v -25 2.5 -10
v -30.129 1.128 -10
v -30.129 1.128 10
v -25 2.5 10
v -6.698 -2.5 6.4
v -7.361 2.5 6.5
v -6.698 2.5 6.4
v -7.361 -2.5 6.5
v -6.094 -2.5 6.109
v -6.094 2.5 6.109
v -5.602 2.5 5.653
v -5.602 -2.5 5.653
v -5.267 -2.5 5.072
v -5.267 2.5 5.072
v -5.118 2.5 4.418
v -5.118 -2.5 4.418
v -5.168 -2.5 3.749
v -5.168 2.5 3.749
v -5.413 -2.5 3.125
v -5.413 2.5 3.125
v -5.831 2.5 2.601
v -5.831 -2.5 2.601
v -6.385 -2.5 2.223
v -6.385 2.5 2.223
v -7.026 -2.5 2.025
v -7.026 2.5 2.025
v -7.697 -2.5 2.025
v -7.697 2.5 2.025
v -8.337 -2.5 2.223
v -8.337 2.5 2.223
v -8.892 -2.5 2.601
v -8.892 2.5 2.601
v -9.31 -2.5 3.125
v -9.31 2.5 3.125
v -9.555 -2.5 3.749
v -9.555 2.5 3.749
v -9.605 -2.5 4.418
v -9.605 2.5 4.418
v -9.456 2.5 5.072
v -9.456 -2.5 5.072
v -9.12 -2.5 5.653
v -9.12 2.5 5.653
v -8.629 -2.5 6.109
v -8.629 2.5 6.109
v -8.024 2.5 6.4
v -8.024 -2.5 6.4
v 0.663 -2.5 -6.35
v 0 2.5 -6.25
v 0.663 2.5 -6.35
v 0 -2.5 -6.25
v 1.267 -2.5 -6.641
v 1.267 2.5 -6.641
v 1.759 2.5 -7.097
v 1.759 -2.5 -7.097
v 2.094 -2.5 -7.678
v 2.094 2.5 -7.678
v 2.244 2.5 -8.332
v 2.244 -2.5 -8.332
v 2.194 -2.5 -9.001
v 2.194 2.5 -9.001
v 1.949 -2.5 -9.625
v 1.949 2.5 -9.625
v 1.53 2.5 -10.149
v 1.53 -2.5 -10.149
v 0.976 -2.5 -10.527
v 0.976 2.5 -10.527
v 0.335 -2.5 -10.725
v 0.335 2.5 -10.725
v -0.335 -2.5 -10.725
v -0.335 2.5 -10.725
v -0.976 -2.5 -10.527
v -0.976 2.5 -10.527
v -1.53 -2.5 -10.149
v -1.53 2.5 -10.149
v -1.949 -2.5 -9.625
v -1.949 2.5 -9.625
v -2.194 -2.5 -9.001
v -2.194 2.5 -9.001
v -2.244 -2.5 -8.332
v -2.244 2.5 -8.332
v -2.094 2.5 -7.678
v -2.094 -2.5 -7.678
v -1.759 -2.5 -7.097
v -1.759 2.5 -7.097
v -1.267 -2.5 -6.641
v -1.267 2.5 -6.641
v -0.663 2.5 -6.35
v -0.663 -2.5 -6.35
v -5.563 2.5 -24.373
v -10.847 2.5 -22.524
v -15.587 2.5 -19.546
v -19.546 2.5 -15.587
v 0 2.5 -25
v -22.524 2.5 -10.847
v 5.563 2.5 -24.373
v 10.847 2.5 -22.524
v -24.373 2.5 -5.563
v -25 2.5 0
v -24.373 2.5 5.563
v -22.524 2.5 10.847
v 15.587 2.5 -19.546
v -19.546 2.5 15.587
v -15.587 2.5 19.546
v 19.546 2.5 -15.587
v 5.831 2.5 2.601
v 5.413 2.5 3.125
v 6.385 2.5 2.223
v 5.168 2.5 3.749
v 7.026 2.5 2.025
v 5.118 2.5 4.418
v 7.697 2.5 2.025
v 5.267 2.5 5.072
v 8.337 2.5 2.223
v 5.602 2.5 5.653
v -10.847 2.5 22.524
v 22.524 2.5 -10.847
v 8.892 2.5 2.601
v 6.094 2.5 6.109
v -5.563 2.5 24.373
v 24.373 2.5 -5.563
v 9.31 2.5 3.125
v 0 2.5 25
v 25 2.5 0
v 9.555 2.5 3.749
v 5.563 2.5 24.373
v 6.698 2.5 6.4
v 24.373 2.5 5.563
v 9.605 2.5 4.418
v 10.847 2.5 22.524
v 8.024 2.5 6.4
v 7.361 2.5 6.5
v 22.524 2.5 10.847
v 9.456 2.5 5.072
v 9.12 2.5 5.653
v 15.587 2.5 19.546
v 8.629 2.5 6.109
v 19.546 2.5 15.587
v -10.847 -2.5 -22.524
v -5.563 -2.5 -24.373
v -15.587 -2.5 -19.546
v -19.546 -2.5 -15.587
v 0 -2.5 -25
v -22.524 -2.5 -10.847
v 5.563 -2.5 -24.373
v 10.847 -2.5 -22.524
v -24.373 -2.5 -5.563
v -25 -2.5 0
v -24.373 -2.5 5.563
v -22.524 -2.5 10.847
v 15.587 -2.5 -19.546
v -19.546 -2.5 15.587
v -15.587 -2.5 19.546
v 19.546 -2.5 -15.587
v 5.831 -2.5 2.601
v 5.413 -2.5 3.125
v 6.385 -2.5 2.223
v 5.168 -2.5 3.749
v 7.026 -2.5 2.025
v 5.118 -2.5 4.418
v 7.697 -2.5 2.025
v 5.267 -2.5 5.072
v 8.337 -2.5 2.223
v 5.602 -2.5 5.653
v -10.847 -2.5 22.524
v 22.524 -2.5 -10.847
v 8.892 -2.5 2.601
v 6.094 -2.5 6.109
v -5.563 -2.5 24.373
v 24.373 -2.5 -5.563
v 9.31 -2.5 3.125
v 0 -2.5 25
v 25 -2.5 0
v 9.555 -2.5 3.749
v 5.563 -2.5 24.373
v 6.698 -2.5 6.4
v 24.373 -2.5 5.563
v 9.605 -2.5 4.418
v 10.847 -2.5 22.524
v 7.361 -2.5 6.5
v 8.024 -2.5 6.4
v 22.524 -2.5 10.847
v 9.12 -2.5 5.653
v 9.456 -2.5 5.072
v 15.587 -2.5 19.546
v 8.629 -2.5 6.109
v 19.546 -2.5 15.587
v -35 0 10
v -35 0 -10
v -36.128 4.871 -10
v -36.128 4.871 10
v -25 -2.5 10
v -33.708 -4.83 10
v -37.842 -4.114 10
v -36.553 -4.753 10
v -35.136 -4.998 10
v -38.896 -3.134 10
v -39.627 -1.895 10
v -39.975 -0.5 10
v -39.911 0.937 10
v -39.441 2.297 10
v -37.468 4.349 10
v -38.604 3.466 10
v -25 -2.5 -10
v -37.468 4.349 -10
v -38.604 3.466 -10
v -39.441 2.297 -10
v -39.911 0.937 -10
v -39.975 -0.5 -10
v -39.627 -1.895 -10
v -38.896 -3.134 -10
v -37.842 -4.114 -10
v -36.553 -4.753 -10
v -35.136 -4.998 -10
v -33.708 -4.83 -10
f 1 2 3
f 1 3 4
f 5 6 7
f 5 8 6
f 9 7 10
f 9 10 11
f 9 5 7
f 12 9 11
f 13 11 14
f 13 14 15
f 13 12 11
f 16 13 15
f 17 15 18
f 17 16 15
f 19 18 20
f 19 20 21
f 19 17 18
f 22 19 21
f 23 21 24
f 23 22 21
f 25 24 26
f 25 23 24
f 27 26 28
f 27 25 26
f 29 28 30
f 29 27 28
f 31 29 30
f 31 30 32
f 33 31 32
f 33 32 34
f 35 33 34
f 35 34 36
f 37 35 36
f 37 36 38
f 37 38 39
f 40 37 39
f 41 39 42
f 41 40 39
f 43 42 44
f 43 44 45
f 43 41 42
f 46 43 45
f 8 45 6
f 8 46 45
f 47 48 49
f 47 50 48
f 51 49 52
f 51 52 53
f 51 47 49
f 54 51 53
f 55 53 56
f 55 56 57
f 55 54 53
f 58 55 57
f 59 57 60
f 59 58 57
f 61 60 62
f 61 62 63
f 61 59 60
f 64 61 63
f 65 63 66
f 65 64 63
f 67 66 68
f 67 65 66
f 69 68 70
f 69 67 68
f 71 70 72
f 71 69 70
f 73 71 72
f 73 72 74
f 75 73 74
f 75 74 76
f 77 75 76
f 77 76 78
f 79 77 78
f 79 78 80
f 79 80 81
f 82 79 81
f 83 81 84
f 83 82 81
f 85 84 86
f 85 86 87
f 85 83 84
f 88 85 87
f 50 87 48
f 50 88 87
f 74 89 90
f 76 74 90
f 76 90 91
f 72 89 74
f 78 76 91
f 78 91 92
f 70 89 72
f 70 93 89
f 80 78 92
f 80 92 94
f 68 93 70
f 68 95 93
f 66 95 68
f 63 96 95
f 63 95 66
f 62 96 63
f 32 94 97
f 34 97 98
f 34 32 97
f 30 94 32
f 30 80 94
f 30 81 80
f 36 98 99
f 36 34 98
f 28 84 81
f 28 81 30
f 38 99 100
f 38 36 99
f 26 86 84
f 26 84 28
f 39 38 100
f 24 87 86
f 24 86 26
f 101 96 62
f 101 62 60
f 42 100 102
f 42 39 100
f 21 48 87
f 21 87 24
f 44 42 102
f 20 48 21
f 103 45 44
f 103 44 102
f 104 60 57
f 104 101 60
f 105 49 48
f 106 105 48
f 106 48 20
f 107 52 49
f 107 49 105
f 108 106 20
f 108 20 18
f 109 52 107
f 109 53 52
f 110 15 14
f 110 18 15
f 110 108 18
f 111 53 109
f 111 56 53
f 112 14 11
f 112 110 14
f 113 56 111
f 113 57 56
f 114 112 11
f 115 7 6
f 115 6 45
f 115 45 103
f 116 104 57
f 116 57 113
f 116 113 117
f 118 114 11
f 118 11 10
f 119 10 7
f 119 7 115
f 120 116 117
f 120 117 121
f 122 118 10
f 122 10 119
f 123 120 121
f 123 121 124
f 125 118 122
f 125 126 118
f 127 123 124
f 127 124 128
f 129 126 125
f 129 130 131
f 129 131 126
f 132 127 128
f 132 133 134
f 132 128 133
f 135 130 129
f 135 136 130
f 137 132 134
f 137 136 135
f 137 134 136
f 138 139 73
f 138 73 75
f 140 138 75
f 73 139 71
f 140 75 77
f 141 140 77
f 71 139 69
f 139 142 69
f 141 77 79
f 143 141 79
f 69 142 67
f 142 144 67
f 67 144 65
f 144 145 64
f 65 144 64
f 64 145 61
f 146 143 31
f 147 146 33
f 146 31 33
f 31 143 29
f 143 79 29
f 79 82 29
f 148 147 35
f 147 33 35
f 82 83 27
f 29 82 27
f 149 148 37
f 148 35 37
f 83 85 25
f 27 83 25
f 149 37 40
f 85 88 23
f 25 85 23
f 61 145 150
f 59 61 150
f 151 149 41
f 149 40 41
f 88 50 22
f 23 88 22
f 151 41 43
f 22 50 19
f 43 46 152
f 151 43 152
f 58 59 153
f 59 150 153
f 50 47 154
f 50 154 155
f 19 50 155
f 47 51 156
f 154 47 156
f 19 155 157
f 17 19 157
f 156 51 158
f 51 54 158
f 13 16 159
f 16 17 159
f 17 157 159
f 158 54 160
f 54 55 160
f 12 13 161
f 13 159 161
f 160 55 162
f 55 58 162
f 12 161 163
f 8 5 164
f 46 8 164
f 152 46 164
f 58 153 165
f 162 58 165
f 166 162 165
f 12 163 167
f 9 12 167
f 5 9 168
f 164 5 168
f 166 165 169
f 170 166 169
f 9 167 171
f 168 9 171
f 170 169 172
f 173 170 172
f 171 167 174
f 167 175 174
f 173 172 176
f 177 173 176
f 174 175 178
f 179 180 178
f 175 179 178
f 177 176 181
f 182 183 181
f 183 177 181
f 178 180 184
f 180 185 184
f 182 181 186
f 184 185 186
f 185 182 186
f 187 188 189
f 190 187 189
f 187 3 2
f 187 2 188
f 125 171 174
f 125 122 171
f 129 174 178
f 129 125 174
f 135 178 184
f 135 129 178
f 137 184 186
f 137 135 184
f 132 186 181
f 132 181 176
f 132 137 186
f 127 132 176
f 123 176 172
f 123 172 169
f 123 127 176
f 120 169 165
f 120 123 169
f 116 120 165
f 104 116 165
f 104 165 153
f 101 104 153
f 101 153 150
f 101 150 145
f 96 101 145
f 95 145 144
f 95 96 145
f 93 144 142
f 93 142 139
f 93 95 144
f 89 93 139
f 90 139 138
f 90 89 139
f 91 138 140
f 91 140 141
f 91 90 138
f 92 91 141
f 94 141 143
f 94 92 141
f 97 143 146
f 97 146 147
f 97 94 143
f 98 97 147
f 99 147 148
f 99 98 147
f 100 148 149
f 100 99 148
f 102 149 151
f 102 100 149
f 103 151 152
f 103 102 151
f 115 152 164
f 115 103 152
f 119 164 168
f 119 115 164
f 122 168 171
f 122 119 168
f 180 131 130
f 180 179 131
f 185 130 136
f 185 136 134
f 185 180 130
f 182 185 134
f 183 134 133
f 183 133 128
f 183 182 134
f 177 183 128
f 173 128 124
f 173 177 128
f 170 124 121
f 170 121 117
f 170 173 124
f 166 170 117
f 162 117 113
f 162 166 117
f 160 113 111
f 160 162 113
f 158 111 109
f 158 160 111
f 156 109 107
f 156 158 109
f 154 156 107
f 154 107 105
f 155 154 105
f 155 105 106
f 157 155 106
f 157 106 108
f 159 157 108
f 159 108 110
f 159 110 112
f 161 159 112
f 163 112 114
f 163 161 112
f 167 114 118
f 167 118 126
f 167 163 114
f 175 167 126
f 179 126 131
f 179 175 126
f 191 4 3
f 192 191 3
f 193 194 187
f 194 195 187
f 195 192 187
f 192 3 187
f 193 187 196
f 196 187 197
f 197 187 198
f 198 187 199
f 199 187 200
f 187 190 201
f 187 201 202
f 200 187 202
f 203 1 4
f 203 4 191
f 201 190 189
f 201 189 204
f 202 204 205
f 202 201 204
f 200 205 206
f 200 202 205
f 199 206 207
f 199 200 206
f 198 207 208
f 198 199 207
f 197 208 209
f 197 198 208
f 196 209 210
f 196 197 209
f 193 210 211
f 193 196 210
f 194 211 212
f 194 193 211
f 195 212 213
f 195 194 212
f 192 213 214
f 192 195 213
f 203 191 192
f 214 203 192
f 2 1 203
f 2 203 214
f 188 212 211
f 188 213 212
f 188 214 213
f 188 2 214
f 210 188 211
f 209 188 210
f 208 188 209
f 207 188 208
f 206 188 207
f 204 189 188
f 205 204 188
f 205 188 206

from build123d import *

# Parameters (mm, degrees)
SKETCH_1_R          = 25
SKETCH_1_R_2        = 2.25
EXTRUDE_1_DEPTH     = 2.5
SKETCH_4_R          = 5
EXTRUDE_2_DEPTH     = 10
EXTRUDE_3_DEPTH     = 20
CUT_EXTRUDE_1_DEPTH = 54.38539126


with BuildPart() as part:
    # Эскиз1 → Бобышка-Вытянуть1 (new, symmetric)
    with BuildSketch(Plane(origin=(0, 0, 0), x_dir=(1, 0, 0), z_dir=(0, 1, 0))):
        with Locations(Location((0, 0, 0), (0, 0, 270))):
            Circle(SKETCH_1_R)
        with Locations(Location((0, 8.5, 0), (0, 0, 270))):
            Circle(SKETCH_1_R_2, mode=Mode.SUBTRACT)
        with Locations(Location((7.361215932, -4.25, 0), (0, 0, 270))):
            Circle(SKETCH_1_R_2, mode=Mode.SUBTRACT)
        with Locations(Location((-7.361215932, -4.25, 0), (0, 0, 270))):
            Circle(SKETCH_1_R_2, mode=Mode.SUBTRACT)
    extrude(amount=EXTRUDE_1_DEPTH, both=True)


with BuildPart() as body_2:
    # Эскиз4 → Бобышка-Вытянуть2 (new, symmetric)
    with BuildSketch(Plane.XY):
        with Locations((-35, 0)):
            Circle(SKETCH_4_R)
    extrude(amount=EXTRUDE_2_DEPTH, both=True)

    # Эскиз5 → Бобышка-Вытянуть3 (add)
    with BuildSketch(Plane(origin=(0, 0, -10), x_dir=(-1, 0, 0), z_dir=(0, 0, -1))):
        Polygon((25, 2.5), (25, -2.5), (33.707515081, -4.830060324), (33.707515081, 0.169939676), align=None)
    extrude(amount=-EXTRUDE_3_DEPTH)

    # Эскиз6 → Вырез-Вытянуть1 (cut, through all)
    with BuildSketch(Plane(origin=(0, 0, -10), x_dir=(-1, 0, 0), z_dir=(0, 0, -1))):
        with BuildLine():
            ThreePointArc((36.1275744, 4.871198618), (32.352857929, 4.241773079), (30.128801382, 1.1275744))
            Line((30.128801382, 1.1275744), (35, 0))
            Line((35, 0), (36.1275744, 4.871198618))
        make_face()
    extrude(amount=-CUT_EXTRUDE_1_DEPTH, mode=Mode.SUBTRACT)


solid = Compound([part.part, body_2.part])
